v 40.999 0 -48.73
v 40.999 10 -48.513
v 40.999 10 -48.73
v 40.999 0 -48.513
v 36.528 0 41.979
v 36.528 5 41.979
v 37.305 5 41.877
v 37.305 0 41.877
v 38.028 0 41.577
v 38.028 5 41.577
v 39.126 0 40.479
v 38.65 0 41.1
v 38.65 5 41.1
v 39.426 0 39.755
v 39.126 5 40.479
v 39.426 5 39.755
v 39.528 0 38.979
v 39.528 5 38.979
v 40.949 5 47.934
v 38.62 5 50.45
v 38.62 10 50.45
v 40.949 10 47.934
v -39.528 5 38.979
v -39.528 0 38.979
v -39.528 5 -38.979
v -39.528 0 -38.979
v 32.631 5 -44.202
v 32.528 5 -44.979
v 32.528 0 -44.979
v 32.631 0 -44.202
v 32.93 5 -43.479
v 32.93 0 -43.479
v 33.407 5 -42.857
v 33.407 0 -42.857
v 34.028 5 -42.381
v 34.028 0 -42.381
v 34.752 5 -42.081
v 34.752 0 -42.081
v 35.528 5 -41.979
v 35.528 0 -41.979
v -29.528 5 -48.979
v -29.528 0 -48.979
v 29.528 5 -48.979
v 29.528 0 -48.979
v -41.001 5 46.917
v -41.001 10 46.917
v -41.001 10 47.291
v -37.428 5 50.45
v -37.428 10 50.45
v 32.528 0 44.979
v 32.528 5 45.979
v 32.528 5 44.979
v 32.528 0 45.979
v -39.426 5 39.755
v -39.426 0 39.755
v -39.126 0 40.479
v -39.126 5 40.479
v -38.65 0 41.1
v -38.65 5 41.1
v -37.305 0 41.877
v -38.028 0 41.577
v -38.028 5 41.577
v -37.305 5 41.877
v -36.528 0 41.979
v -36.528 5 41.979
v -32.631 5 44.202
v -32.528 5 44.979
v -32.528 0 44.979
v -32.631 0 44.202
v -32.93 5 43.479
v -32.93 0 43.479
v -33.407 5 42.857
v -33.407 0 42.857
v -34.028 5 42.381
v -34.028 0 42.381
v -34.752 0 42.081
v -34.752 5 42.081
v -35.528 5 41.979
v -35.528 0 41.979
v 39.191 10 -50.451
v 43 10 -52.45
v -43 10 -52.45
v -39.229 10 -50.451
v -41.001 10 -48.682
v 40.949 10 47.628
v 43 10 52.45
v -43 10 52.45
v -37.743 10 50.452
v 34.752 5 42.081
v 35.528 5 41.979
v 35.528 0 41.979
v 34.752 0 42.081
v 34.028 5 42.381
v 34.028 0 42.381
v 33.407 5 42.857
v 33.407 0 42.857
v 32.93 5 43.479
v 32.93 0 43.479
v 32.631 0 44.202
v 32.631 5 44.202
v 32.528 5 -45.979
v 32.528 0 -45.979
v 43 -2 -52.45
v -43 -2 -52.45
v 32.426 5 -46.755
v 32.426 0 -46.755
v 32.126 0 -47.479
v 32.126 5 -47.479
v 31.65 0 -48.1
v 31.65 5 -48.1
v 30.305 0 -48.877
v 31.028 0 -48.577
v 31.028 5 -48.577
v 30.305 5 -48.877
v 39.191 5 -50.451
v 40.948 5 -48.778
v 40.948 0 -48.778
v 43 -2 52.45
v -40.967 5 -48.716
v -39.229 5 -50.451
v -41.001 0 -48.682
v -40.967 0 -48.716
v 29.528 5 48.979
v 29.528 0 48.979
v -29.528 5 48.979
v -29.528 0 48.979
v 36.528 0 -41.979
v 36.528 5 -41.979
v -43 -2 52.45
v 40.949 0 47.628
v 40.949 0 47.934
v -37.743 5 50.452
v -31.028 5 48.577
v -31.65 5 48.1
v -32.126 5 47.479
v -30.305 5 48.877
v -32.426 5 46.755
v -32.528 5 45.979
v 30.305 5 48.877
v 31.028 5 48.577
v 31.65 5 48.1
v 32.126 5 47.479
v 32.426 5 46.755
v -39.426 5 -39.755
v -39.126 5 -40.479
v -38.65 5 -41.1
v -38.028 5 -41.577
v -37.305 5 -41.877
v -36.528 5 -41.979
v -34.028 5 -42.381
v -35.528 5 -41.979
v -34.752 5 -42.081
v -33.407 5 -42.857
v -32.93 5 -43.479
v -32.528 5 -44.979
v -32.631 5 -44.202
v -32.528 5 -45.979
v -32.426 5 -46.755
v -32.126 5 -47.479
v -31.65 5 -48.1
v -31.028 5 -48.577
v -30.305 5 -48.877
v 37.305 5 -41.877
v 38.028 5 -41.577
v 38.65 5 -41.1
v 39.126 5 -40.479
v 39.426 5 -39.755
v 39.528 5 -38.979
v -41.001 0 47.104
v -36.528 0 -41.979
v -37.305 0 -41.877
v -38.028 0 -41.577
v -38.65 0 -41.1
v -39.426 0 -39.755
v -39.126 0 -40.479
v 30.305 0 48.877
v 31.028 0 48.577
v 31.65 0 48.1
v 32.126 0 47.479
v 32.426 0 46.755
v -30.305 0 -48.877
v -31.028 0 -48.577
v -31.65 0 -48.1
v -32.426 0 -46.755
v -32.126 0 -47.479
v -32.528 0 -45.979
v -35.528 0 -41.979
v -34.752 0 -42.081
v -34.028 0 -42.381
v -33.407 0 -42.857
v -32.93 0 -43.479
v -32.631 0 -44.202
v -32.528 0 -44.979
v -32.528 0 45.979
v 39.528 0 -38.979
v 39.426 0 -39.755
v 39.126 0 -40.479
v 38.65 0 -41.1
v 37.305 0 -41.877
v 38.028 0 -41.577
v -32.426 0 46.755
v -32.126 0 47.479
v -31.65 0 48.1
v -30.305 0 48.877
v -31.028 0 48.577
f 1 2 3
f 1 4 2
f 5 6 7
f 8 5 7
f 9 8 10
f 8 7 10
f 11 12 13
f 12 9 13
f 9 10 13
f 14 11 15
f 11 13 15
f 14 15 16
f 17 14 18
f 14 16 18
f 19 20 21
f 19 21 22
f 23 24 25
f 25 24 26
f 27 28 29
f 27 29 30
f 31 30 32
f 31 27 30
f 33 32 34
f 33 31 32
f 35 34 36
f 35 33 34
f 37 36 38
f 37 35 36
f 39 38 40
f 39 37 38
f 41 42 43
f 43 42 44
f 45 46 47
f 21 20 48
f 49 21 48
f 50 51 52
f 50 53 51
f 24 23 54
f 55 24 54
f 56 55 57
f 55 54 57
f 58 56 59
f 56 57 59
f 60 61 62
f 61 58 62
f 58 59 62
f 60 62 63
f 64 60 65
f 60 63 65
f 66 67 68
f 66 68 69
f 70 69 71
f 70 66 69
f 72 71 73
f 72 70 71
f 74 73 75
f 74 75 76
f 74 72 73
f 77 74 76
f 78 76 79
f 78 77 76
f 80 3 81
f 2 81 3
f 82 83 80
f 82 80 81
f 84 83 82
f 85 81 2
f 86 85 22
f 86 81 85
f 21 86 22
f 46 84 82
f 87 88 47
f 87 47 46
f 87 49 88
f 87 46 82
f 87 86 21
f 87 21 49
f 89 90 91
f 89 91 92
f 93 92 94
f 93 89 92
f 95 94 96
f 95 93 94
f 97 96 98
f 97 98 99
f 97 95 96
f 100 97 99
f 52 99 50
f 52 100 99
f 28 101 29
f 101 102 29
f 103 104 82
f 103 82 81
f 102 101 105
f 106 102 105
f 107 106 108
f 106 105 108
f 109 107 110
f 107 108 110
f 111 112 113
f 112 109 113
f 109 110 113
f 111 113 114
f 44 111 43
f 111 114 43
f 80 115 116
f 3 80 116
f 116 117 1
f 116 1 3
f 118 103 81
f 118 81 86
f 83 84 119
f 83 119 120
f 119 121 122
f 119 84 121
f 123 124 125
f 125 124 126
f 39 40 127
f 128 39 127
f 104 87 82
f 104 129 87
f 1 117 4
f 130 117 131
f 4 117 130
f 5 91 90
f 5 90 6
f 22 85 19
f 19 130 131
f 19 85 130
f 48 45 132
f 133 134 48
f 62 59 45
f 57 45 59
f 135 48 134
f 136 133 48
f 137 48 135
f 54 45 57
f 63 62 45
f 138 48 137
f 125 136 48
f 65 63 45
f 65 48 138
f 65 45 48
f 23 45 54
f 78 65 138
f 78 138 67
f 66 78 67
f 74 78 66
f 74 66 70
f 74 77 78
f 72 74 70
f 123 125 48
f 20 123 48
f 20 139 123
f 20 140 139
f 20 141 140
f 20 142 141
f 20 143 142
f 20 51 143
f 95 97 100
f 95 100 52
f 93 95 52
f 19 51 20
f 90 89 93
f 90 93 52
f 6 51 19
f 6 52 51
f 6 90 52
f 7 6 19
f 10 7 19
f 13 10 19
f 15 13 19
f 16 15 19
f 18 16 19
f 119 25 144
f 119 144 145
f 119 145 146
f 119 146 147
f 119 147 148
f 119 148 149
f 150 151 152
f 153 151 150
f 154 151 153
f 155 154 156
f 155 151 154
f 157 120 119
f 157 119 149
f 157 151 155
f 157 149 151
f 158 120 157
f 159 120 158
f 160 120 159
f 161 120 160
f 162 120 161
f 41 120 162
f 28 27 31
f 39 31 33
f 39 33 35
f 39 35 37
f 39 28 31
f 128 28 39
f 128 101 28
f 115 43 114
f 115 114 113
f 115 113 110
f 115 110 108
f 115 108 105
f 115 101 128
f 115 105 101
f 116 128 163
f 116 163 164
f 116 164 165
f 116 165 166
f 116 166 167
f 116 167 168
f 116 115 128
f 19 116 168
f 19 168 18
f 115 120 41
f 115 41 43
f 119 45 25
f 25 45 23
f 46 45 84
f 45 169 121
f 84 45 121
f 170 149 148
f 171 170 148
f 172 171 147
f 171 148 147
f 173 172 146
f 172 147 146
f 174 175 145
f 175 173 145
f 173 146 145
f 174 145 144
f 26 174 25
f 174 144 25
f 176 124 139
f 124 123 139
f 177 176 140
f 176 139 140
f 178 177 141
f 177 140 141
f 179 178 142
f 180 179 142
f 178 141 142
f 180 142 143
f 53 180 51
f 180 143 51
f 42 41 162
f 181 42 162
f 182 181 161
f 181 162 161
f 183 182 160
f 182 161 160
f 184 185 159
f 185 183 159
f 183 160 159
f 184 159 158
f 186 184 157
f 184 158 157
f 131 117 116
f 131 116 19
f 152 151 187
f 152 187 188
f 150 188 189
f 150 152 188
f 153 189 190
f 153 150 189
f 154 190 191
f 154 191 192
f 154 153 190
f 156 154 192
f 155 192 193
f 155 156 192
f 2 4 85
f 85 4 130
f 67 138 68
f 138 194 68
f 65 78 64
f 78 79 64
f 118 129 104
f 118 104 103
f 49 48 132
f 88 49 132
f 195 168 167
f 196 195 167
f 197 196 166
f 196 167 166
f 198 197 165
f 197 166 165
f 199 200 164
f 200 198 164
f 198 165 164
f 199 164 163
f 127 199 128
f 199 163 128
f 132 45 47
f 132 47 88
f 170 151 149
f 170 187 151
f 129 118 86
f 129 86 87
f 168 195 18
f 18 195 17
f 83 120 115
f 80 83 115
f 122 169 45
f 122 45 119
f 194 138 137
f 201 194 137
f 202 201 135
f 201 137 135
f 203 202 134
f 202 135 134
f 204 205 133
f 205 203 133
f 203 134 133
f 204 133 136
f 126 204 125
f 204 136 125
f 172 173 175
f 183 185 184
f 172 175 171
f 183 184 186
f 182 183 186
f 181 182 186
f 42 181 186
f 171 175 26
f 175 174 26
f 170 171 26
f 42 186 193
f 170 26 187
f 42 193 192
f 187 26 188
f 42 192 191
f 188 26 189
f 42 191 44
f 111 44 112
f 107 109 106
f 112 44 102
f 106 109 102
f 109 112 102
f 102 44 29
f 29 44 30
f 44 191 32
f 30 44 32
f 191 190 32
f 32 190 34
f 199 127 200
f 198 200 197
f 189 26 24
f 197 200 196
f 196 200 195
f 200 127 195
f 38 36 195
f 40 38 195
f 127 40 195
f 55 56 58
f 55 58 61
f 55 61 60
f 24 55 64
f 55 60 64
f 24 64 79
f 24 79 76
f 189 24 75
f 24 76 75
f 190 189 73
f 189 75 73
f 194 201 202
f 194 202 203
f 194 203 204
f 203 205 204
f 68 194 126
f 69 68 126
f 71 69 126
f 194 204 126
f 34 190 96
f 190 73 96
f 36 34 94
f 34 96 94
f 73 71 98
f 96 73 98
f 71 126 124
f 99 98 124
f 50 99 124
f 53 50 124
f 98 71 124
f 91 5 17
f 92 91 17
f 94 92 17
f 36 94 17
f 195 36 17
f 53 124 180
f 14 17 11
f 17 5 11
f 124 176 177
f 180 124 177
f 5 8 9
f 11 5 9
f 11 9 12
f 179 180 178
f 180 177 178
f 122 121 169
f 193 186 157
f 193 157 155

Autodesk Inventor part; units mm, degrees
ref_plane "YZ Plane" through (0, 0, 0) normal (1, 0, 0) x (0, 1, 0)
ref_plane "XZ Plane" through (0, 0, 0) normal (0, 1, 0) x (-1, 0, 0)
ref_plane "XY Plane" through (0, 0, 0) normal (0, 0, 1) x (1, 0, 0)
sketch "Sketch1" plane through (0, 0, 0) normal (0, 1, 0) x (-1, 0, 0)
  line L0 (41, 50.45) -> (40.9472, -50.4928) construction
  line L1 (40.9472, -50.4928) -> (-41, -50.45) construction
  line L2 (-41, -50.45) -> (-40.9472, 50.4928) construction
  line L3 (-40.9472, 50.4928) -> (41, 50.45) construction
  line L4 (-41, 50.45) -> (41, -50.45) construction
  line L5 (41, 50.45) -> (-41, -50.45) construction
  line L6 (-43, 52.45) -> (43, 52.45)
  line L7 (43, 52.45) -> (43, -52.45)
  line L8 (43, -52.45) -> (-43, -52.45)
  line L9 (-43, -52.45) -> (-43, 52.45)
  line L10 (-43, 52.45) -> (43, -52.45) construction
  line L11 (43, 52.45) -> (-43, -52.45) construction
  line L12 (41, 50.45) -> (41, 50.0105)
  line L13 (41.001, 46.9167) -> (41.001, -48.4427)
  line L14 (41, -50.45) -> (40.9473, -50.45)
  line L15 (39.0158, -50.4509) -> (-38.9625, -50.4509)
  line L16 (-38.3742, 50.45) -> (37.4278, 50.45)
  line L17 (-40.999, -48.5131) -> (-40.9487, 47.6278)
  line L18 (37.4278, 50.45) -> (37.7432, 50.4517)
  line L19 (41.001, 46.9167) -> (41.0014, 47.2908)
  line L20 (41.0014, 47.2908) -> (37.7432, 50.4517)
  line L21 (41.001, -48.4427) -> (41.001, -48.6823)
  line L22 (41.001, -48.6823) -> (39.229, -50.4509)
  line L23 (39.229, -50.4509) -> (39.0158, -50.4509)
  line L24 (-38.9625, -50.4509) -> (-39.191, -50.4509)
  line L25 (-39.191, -50.4509) -> (-40.9991, -48.7299)
  line L26 (-40.999, -48.5131) -> (-40.9991, -48.7299)
  line L27 (-40.9487, 47.6278) -> (-40.9486, 47.9339)
  line L28 (-38.3742, 50.45) -> (-38.6199, 50.45)
  line L29 (-38.6199, 50.45) -> (-40.9486, 47.9339)
  point P0 (0, 0)
  dimension "d48" = 82
  dimension "d49" = 100.9
  dimension "d50" = 86
  dimension "d51" = 104.9
extrude "Extrusion3" add sketch "Sketch1" along normal blind 10
sketch "Sketch3" plane through (0, 0, 0) normal (0, -1, 0) x (1, 0, 0)
  line L0 (43, -52.45) -> (-43, -52.45) projected
  line L1 (-43, 52.45) -> (43, 52.45)
  line L2 (43, 52.45) -> (43, -52.45)
  line L3 (43, -52.45) -> (-43, -52.45)
  line L4 (-43, -52.45) -> (-43, 52.45)
  line L5 (-43, 52.45) -> (43, -52.45) construction
  line L6 (43, 52.45) -> (-43, -52.45) construction
  point P0 (0, 0)
extrude "Extrusion4" add sketch "Sketch3" along normal blind 2
sketch "Sketch4" plane through (0, 0, 0) normal (0, 1, 0) x (1, 0, 0)
  line L0 (-40.966, -50.4517) -> (-40.966, 50.4509) construction
  line L1 (-40.966, 50.4509) -> (40.9486, 50.4509) construction
  line L2 (40.9486, 50.4509) -> (40.9486, -50.4517) construction
  line L3 (40.9486, -50.4517) -> (-40.966, -50.4517) construction
  line L4 (-41.001, -46.9167) -> (-41.001, 48.6823) projected
  line L5 (-37.7432, -50.4517) -> (-41.0014, -47.2908) projected
  line L6 (38.6199, -50.45) -> (-37.4278, -50.45) projected
  line L7 (43, 52.45) -> (-43, 52.45) projected
  line L8 (-43, 52.45) -> (-43, -52.45) projected
  line L9 (-43, -52.45) -> (43, -52.45) projected
  line L10 (43, -52.45) -> (43, 52.45) projected
  line L11 (-41.0014, -47.2908) -> (-41.001, -46.9167) projected
  line L12 (-41.001, -46.9167) -> (-41.001, 48.6823) projected
  line L13 (-41.001, 48.6823) -> (-39.229, 50.4509) projected
  line L14 (-39.229, 50.4509) -> (38.9625, 50.4509) projected
  line L15 (38.9625, 50.4509) -> (39.191, 50.4509) projected
  line L16 (39.191, 50.4509) -> (40.9991, 48.7299) projected
  line L17 (40.9991, 48.7299) -> (40.9486, -47.9339) projected
  line L18 (40.9486, -47.9339) -> (38.6199, -50.45) projected
  line L19 (38.6199, -50.45) -> (-37.4278, -50.45) projected
  line L20 (-37.4278, -50.45) -> (-37.7432, -50.4517) projected
  line L21 (-37.7432, -50.4517) -> (-41.0014, -47.2908) projected
  line L22 (-39.229, 50.4509) -> (38.9625, 50.4509) projected
  line L23 (-41.001, 48.6823) -> (-39.229, 50.4509) projected
  point P0 (0, 0)
sketch "Sketch5" plane through (0, 0, 0) normal (0, 1, 0) x (1, 0, 0)
  line L0 (-37.7432, -50.4517) -> (-41.0014, -47.2908) projected
  line L1 (-37.4278, -50.45) -> (-37.7432, -50.4517) projected
  line L2 (38.6199, -50.45) -> (-37.4278, -50.45) projected
  line L3 (40.9486, -47.9339) -> (38.6199, -50.45) projected
  line L4 (40.9991, 48.7299) -> (40.9486, -47.9339) projected
  line L5 (39.191, 50.4509) -> (40.9991, 48.7299) projected
  line L6 (38.9625, 50.4509) -> (39.191, 50.4509) projected
  line L7 (-39.229, 50.4509) -> (38.9625, 50.4509) projected
  line L8 (-41.001, 48.6823) -> (-39.229, 50.4509) projected
  line L9 (-41.001, -46.9167) -> (-41.001, 48.6823) projected
  line L10 (-41.0014, -47.2908) -> (-41.001, -46.9167) projected
  line L11 (-37.7432, -50.4517) -> (-41.0014, -47.2908) projected
  line L12 (38.6199, -50.45) -> (-37.4278, -50.45) projected
  line L13 (-37.4278, -50.45) -> (-37.7432, -50.4517) projected
  line L14 (-41.001, -46.9167) -> (-41.001, 48.6823) projected
  line L15 (-41.0014, -47.2908) -> (-41.001, -46.9167) projected
  line L16 (-41.001, 48.6823) -> (-39.229, 50.4509) projected
  line L17 (-39.229, 50.4509) -> (38.9625, 50.4509) projected
  line L18 (39.191, 50.4509) -> (40.9991, 48.7299) projected
  line L19 (40.9991, 48.7299) -> (40.9486, -47.9339) projected
  line L20 (40.9486, -47.9339) -> (38.6199, -50.45) projected
  line L21 (-41.0014, -47.2908) -> (-40.9669, 48.7164)
  line L22 (-39.229, 50.4509) -> (39.191, 50.4509)
  line L23 (40.9485, 48.778) -> (40.9486, -47.9339)
  line L24 (38.6199, -50.45) -> (-37.7432, -50.4517)
  line L25 (-37.7432, -50.4517) -> (-41.0014, -47.2908)
  line L26 (39.5283, -48.9788) -> (-39.5283, -48.9788)
  line L27 (-39.5283, -48.9788) -> (-39.5283, 48.9788)
  line L28 (-39.5283, 48.9788) -> (39.5283, 48.9788)
  line L29 (39.5283, 48.9788) -> (39.5283, -48.9788)
  line L30 (39.5283, -48.9788) -> (-39.5283, 48.9788) construction
  line L31 (-39.5283, -48.9788) -> (39.5283, 48.9788) construction
  line L32 (-39.5283, -48.9788) -> (-32.5283, -48.9788)
  line L33 (-32.5283, -48.9788) -> (-32.5283, -41.9788)
  line L34 (-32.5283, -41.9788) -> (-39.5283, -41.9788)
  line L35 (-39.5283, -41.9788) -> (-39.5283, -48.9788)
  line L36 (-39.5283, 48.9788) -> (-32.5283, 48.9788)
  line L37 (-32.5283, 48.9788) -> (-32.5283, 41.9788)
  line L38 (-32.5283, 41.9788) -> (-39.5283, 41.9788)
  line L39 (-39.5283, 41.9788) -> (-39.5283, 48.9788)
  line L40 (39.5283, 48.9788) -> (32.5283, 48.9788)
  line L41 (32.5283, 48.9788) -> (32.5283, 41.9788)
  line L42 (32.5283, 41.9788) -> (39.5283, 41.9788)
  line L43 (39.5283, 41.9788) -> (39.5283, 48.9788)
  line L44 (39.5283, -48.9788) -> (32.5283, -48.9788)
  line L45 (32.5283, -48.9788) -> (32.5283, -41.9788)
  line L46 (32.5283, -41.9788) -> (39.5283, -41.9788)
  line L47 (39.5283, -41.9788) -> (39.5283, -48.9788)
  point P0 (0, 0)
  point P1 (-41.001, -46.1517)
  point P2 (-39.5283, -48.7199)
  point P3 (-39.2615, -48.9788)
  dimension "d152" = 7
  dimension "d153" = 7
  dimension "d154" = 7
  dimension "d155" = 7
  dimension "d156" = 7
  dimension "d157" = 7
  dimension "d158" = 7
  dimension "d159" = 7
extrude "Extrusion5" add sketch "Sketch5" along normal blind 5 contours L0 L26 L29 L28 L27 L10 L21 L8 L7 L6 L5 L23 L3 L2 L1 | L0 L27 L34 L33 L26 | L45 L46 L29 L26 | L27 L28 L37 L38 | L42 L41 L28 L29
fillet "Fillet1" radius 3 12 edges at (-39.5283, 2.5, 41.9788) (-32.5283, 2.5, 41.9788) (-32.5283, 2.5, 48.9788) (-32.5283, 2.5, -48.9788) (-32.5283, 2.5, -41.9788) (-39.5283, 2.5, -41.9788) (32.5283, 2.5, -48.9788) (32.5283, 2.5, -41.9788) (39.5283, 2.5, -41.9788) (39.5283, 2.5, 41.9788) (32.5283, 2.5, 41.9788) (32.5283, 2.5, 48.9788)
properties part number "box"
